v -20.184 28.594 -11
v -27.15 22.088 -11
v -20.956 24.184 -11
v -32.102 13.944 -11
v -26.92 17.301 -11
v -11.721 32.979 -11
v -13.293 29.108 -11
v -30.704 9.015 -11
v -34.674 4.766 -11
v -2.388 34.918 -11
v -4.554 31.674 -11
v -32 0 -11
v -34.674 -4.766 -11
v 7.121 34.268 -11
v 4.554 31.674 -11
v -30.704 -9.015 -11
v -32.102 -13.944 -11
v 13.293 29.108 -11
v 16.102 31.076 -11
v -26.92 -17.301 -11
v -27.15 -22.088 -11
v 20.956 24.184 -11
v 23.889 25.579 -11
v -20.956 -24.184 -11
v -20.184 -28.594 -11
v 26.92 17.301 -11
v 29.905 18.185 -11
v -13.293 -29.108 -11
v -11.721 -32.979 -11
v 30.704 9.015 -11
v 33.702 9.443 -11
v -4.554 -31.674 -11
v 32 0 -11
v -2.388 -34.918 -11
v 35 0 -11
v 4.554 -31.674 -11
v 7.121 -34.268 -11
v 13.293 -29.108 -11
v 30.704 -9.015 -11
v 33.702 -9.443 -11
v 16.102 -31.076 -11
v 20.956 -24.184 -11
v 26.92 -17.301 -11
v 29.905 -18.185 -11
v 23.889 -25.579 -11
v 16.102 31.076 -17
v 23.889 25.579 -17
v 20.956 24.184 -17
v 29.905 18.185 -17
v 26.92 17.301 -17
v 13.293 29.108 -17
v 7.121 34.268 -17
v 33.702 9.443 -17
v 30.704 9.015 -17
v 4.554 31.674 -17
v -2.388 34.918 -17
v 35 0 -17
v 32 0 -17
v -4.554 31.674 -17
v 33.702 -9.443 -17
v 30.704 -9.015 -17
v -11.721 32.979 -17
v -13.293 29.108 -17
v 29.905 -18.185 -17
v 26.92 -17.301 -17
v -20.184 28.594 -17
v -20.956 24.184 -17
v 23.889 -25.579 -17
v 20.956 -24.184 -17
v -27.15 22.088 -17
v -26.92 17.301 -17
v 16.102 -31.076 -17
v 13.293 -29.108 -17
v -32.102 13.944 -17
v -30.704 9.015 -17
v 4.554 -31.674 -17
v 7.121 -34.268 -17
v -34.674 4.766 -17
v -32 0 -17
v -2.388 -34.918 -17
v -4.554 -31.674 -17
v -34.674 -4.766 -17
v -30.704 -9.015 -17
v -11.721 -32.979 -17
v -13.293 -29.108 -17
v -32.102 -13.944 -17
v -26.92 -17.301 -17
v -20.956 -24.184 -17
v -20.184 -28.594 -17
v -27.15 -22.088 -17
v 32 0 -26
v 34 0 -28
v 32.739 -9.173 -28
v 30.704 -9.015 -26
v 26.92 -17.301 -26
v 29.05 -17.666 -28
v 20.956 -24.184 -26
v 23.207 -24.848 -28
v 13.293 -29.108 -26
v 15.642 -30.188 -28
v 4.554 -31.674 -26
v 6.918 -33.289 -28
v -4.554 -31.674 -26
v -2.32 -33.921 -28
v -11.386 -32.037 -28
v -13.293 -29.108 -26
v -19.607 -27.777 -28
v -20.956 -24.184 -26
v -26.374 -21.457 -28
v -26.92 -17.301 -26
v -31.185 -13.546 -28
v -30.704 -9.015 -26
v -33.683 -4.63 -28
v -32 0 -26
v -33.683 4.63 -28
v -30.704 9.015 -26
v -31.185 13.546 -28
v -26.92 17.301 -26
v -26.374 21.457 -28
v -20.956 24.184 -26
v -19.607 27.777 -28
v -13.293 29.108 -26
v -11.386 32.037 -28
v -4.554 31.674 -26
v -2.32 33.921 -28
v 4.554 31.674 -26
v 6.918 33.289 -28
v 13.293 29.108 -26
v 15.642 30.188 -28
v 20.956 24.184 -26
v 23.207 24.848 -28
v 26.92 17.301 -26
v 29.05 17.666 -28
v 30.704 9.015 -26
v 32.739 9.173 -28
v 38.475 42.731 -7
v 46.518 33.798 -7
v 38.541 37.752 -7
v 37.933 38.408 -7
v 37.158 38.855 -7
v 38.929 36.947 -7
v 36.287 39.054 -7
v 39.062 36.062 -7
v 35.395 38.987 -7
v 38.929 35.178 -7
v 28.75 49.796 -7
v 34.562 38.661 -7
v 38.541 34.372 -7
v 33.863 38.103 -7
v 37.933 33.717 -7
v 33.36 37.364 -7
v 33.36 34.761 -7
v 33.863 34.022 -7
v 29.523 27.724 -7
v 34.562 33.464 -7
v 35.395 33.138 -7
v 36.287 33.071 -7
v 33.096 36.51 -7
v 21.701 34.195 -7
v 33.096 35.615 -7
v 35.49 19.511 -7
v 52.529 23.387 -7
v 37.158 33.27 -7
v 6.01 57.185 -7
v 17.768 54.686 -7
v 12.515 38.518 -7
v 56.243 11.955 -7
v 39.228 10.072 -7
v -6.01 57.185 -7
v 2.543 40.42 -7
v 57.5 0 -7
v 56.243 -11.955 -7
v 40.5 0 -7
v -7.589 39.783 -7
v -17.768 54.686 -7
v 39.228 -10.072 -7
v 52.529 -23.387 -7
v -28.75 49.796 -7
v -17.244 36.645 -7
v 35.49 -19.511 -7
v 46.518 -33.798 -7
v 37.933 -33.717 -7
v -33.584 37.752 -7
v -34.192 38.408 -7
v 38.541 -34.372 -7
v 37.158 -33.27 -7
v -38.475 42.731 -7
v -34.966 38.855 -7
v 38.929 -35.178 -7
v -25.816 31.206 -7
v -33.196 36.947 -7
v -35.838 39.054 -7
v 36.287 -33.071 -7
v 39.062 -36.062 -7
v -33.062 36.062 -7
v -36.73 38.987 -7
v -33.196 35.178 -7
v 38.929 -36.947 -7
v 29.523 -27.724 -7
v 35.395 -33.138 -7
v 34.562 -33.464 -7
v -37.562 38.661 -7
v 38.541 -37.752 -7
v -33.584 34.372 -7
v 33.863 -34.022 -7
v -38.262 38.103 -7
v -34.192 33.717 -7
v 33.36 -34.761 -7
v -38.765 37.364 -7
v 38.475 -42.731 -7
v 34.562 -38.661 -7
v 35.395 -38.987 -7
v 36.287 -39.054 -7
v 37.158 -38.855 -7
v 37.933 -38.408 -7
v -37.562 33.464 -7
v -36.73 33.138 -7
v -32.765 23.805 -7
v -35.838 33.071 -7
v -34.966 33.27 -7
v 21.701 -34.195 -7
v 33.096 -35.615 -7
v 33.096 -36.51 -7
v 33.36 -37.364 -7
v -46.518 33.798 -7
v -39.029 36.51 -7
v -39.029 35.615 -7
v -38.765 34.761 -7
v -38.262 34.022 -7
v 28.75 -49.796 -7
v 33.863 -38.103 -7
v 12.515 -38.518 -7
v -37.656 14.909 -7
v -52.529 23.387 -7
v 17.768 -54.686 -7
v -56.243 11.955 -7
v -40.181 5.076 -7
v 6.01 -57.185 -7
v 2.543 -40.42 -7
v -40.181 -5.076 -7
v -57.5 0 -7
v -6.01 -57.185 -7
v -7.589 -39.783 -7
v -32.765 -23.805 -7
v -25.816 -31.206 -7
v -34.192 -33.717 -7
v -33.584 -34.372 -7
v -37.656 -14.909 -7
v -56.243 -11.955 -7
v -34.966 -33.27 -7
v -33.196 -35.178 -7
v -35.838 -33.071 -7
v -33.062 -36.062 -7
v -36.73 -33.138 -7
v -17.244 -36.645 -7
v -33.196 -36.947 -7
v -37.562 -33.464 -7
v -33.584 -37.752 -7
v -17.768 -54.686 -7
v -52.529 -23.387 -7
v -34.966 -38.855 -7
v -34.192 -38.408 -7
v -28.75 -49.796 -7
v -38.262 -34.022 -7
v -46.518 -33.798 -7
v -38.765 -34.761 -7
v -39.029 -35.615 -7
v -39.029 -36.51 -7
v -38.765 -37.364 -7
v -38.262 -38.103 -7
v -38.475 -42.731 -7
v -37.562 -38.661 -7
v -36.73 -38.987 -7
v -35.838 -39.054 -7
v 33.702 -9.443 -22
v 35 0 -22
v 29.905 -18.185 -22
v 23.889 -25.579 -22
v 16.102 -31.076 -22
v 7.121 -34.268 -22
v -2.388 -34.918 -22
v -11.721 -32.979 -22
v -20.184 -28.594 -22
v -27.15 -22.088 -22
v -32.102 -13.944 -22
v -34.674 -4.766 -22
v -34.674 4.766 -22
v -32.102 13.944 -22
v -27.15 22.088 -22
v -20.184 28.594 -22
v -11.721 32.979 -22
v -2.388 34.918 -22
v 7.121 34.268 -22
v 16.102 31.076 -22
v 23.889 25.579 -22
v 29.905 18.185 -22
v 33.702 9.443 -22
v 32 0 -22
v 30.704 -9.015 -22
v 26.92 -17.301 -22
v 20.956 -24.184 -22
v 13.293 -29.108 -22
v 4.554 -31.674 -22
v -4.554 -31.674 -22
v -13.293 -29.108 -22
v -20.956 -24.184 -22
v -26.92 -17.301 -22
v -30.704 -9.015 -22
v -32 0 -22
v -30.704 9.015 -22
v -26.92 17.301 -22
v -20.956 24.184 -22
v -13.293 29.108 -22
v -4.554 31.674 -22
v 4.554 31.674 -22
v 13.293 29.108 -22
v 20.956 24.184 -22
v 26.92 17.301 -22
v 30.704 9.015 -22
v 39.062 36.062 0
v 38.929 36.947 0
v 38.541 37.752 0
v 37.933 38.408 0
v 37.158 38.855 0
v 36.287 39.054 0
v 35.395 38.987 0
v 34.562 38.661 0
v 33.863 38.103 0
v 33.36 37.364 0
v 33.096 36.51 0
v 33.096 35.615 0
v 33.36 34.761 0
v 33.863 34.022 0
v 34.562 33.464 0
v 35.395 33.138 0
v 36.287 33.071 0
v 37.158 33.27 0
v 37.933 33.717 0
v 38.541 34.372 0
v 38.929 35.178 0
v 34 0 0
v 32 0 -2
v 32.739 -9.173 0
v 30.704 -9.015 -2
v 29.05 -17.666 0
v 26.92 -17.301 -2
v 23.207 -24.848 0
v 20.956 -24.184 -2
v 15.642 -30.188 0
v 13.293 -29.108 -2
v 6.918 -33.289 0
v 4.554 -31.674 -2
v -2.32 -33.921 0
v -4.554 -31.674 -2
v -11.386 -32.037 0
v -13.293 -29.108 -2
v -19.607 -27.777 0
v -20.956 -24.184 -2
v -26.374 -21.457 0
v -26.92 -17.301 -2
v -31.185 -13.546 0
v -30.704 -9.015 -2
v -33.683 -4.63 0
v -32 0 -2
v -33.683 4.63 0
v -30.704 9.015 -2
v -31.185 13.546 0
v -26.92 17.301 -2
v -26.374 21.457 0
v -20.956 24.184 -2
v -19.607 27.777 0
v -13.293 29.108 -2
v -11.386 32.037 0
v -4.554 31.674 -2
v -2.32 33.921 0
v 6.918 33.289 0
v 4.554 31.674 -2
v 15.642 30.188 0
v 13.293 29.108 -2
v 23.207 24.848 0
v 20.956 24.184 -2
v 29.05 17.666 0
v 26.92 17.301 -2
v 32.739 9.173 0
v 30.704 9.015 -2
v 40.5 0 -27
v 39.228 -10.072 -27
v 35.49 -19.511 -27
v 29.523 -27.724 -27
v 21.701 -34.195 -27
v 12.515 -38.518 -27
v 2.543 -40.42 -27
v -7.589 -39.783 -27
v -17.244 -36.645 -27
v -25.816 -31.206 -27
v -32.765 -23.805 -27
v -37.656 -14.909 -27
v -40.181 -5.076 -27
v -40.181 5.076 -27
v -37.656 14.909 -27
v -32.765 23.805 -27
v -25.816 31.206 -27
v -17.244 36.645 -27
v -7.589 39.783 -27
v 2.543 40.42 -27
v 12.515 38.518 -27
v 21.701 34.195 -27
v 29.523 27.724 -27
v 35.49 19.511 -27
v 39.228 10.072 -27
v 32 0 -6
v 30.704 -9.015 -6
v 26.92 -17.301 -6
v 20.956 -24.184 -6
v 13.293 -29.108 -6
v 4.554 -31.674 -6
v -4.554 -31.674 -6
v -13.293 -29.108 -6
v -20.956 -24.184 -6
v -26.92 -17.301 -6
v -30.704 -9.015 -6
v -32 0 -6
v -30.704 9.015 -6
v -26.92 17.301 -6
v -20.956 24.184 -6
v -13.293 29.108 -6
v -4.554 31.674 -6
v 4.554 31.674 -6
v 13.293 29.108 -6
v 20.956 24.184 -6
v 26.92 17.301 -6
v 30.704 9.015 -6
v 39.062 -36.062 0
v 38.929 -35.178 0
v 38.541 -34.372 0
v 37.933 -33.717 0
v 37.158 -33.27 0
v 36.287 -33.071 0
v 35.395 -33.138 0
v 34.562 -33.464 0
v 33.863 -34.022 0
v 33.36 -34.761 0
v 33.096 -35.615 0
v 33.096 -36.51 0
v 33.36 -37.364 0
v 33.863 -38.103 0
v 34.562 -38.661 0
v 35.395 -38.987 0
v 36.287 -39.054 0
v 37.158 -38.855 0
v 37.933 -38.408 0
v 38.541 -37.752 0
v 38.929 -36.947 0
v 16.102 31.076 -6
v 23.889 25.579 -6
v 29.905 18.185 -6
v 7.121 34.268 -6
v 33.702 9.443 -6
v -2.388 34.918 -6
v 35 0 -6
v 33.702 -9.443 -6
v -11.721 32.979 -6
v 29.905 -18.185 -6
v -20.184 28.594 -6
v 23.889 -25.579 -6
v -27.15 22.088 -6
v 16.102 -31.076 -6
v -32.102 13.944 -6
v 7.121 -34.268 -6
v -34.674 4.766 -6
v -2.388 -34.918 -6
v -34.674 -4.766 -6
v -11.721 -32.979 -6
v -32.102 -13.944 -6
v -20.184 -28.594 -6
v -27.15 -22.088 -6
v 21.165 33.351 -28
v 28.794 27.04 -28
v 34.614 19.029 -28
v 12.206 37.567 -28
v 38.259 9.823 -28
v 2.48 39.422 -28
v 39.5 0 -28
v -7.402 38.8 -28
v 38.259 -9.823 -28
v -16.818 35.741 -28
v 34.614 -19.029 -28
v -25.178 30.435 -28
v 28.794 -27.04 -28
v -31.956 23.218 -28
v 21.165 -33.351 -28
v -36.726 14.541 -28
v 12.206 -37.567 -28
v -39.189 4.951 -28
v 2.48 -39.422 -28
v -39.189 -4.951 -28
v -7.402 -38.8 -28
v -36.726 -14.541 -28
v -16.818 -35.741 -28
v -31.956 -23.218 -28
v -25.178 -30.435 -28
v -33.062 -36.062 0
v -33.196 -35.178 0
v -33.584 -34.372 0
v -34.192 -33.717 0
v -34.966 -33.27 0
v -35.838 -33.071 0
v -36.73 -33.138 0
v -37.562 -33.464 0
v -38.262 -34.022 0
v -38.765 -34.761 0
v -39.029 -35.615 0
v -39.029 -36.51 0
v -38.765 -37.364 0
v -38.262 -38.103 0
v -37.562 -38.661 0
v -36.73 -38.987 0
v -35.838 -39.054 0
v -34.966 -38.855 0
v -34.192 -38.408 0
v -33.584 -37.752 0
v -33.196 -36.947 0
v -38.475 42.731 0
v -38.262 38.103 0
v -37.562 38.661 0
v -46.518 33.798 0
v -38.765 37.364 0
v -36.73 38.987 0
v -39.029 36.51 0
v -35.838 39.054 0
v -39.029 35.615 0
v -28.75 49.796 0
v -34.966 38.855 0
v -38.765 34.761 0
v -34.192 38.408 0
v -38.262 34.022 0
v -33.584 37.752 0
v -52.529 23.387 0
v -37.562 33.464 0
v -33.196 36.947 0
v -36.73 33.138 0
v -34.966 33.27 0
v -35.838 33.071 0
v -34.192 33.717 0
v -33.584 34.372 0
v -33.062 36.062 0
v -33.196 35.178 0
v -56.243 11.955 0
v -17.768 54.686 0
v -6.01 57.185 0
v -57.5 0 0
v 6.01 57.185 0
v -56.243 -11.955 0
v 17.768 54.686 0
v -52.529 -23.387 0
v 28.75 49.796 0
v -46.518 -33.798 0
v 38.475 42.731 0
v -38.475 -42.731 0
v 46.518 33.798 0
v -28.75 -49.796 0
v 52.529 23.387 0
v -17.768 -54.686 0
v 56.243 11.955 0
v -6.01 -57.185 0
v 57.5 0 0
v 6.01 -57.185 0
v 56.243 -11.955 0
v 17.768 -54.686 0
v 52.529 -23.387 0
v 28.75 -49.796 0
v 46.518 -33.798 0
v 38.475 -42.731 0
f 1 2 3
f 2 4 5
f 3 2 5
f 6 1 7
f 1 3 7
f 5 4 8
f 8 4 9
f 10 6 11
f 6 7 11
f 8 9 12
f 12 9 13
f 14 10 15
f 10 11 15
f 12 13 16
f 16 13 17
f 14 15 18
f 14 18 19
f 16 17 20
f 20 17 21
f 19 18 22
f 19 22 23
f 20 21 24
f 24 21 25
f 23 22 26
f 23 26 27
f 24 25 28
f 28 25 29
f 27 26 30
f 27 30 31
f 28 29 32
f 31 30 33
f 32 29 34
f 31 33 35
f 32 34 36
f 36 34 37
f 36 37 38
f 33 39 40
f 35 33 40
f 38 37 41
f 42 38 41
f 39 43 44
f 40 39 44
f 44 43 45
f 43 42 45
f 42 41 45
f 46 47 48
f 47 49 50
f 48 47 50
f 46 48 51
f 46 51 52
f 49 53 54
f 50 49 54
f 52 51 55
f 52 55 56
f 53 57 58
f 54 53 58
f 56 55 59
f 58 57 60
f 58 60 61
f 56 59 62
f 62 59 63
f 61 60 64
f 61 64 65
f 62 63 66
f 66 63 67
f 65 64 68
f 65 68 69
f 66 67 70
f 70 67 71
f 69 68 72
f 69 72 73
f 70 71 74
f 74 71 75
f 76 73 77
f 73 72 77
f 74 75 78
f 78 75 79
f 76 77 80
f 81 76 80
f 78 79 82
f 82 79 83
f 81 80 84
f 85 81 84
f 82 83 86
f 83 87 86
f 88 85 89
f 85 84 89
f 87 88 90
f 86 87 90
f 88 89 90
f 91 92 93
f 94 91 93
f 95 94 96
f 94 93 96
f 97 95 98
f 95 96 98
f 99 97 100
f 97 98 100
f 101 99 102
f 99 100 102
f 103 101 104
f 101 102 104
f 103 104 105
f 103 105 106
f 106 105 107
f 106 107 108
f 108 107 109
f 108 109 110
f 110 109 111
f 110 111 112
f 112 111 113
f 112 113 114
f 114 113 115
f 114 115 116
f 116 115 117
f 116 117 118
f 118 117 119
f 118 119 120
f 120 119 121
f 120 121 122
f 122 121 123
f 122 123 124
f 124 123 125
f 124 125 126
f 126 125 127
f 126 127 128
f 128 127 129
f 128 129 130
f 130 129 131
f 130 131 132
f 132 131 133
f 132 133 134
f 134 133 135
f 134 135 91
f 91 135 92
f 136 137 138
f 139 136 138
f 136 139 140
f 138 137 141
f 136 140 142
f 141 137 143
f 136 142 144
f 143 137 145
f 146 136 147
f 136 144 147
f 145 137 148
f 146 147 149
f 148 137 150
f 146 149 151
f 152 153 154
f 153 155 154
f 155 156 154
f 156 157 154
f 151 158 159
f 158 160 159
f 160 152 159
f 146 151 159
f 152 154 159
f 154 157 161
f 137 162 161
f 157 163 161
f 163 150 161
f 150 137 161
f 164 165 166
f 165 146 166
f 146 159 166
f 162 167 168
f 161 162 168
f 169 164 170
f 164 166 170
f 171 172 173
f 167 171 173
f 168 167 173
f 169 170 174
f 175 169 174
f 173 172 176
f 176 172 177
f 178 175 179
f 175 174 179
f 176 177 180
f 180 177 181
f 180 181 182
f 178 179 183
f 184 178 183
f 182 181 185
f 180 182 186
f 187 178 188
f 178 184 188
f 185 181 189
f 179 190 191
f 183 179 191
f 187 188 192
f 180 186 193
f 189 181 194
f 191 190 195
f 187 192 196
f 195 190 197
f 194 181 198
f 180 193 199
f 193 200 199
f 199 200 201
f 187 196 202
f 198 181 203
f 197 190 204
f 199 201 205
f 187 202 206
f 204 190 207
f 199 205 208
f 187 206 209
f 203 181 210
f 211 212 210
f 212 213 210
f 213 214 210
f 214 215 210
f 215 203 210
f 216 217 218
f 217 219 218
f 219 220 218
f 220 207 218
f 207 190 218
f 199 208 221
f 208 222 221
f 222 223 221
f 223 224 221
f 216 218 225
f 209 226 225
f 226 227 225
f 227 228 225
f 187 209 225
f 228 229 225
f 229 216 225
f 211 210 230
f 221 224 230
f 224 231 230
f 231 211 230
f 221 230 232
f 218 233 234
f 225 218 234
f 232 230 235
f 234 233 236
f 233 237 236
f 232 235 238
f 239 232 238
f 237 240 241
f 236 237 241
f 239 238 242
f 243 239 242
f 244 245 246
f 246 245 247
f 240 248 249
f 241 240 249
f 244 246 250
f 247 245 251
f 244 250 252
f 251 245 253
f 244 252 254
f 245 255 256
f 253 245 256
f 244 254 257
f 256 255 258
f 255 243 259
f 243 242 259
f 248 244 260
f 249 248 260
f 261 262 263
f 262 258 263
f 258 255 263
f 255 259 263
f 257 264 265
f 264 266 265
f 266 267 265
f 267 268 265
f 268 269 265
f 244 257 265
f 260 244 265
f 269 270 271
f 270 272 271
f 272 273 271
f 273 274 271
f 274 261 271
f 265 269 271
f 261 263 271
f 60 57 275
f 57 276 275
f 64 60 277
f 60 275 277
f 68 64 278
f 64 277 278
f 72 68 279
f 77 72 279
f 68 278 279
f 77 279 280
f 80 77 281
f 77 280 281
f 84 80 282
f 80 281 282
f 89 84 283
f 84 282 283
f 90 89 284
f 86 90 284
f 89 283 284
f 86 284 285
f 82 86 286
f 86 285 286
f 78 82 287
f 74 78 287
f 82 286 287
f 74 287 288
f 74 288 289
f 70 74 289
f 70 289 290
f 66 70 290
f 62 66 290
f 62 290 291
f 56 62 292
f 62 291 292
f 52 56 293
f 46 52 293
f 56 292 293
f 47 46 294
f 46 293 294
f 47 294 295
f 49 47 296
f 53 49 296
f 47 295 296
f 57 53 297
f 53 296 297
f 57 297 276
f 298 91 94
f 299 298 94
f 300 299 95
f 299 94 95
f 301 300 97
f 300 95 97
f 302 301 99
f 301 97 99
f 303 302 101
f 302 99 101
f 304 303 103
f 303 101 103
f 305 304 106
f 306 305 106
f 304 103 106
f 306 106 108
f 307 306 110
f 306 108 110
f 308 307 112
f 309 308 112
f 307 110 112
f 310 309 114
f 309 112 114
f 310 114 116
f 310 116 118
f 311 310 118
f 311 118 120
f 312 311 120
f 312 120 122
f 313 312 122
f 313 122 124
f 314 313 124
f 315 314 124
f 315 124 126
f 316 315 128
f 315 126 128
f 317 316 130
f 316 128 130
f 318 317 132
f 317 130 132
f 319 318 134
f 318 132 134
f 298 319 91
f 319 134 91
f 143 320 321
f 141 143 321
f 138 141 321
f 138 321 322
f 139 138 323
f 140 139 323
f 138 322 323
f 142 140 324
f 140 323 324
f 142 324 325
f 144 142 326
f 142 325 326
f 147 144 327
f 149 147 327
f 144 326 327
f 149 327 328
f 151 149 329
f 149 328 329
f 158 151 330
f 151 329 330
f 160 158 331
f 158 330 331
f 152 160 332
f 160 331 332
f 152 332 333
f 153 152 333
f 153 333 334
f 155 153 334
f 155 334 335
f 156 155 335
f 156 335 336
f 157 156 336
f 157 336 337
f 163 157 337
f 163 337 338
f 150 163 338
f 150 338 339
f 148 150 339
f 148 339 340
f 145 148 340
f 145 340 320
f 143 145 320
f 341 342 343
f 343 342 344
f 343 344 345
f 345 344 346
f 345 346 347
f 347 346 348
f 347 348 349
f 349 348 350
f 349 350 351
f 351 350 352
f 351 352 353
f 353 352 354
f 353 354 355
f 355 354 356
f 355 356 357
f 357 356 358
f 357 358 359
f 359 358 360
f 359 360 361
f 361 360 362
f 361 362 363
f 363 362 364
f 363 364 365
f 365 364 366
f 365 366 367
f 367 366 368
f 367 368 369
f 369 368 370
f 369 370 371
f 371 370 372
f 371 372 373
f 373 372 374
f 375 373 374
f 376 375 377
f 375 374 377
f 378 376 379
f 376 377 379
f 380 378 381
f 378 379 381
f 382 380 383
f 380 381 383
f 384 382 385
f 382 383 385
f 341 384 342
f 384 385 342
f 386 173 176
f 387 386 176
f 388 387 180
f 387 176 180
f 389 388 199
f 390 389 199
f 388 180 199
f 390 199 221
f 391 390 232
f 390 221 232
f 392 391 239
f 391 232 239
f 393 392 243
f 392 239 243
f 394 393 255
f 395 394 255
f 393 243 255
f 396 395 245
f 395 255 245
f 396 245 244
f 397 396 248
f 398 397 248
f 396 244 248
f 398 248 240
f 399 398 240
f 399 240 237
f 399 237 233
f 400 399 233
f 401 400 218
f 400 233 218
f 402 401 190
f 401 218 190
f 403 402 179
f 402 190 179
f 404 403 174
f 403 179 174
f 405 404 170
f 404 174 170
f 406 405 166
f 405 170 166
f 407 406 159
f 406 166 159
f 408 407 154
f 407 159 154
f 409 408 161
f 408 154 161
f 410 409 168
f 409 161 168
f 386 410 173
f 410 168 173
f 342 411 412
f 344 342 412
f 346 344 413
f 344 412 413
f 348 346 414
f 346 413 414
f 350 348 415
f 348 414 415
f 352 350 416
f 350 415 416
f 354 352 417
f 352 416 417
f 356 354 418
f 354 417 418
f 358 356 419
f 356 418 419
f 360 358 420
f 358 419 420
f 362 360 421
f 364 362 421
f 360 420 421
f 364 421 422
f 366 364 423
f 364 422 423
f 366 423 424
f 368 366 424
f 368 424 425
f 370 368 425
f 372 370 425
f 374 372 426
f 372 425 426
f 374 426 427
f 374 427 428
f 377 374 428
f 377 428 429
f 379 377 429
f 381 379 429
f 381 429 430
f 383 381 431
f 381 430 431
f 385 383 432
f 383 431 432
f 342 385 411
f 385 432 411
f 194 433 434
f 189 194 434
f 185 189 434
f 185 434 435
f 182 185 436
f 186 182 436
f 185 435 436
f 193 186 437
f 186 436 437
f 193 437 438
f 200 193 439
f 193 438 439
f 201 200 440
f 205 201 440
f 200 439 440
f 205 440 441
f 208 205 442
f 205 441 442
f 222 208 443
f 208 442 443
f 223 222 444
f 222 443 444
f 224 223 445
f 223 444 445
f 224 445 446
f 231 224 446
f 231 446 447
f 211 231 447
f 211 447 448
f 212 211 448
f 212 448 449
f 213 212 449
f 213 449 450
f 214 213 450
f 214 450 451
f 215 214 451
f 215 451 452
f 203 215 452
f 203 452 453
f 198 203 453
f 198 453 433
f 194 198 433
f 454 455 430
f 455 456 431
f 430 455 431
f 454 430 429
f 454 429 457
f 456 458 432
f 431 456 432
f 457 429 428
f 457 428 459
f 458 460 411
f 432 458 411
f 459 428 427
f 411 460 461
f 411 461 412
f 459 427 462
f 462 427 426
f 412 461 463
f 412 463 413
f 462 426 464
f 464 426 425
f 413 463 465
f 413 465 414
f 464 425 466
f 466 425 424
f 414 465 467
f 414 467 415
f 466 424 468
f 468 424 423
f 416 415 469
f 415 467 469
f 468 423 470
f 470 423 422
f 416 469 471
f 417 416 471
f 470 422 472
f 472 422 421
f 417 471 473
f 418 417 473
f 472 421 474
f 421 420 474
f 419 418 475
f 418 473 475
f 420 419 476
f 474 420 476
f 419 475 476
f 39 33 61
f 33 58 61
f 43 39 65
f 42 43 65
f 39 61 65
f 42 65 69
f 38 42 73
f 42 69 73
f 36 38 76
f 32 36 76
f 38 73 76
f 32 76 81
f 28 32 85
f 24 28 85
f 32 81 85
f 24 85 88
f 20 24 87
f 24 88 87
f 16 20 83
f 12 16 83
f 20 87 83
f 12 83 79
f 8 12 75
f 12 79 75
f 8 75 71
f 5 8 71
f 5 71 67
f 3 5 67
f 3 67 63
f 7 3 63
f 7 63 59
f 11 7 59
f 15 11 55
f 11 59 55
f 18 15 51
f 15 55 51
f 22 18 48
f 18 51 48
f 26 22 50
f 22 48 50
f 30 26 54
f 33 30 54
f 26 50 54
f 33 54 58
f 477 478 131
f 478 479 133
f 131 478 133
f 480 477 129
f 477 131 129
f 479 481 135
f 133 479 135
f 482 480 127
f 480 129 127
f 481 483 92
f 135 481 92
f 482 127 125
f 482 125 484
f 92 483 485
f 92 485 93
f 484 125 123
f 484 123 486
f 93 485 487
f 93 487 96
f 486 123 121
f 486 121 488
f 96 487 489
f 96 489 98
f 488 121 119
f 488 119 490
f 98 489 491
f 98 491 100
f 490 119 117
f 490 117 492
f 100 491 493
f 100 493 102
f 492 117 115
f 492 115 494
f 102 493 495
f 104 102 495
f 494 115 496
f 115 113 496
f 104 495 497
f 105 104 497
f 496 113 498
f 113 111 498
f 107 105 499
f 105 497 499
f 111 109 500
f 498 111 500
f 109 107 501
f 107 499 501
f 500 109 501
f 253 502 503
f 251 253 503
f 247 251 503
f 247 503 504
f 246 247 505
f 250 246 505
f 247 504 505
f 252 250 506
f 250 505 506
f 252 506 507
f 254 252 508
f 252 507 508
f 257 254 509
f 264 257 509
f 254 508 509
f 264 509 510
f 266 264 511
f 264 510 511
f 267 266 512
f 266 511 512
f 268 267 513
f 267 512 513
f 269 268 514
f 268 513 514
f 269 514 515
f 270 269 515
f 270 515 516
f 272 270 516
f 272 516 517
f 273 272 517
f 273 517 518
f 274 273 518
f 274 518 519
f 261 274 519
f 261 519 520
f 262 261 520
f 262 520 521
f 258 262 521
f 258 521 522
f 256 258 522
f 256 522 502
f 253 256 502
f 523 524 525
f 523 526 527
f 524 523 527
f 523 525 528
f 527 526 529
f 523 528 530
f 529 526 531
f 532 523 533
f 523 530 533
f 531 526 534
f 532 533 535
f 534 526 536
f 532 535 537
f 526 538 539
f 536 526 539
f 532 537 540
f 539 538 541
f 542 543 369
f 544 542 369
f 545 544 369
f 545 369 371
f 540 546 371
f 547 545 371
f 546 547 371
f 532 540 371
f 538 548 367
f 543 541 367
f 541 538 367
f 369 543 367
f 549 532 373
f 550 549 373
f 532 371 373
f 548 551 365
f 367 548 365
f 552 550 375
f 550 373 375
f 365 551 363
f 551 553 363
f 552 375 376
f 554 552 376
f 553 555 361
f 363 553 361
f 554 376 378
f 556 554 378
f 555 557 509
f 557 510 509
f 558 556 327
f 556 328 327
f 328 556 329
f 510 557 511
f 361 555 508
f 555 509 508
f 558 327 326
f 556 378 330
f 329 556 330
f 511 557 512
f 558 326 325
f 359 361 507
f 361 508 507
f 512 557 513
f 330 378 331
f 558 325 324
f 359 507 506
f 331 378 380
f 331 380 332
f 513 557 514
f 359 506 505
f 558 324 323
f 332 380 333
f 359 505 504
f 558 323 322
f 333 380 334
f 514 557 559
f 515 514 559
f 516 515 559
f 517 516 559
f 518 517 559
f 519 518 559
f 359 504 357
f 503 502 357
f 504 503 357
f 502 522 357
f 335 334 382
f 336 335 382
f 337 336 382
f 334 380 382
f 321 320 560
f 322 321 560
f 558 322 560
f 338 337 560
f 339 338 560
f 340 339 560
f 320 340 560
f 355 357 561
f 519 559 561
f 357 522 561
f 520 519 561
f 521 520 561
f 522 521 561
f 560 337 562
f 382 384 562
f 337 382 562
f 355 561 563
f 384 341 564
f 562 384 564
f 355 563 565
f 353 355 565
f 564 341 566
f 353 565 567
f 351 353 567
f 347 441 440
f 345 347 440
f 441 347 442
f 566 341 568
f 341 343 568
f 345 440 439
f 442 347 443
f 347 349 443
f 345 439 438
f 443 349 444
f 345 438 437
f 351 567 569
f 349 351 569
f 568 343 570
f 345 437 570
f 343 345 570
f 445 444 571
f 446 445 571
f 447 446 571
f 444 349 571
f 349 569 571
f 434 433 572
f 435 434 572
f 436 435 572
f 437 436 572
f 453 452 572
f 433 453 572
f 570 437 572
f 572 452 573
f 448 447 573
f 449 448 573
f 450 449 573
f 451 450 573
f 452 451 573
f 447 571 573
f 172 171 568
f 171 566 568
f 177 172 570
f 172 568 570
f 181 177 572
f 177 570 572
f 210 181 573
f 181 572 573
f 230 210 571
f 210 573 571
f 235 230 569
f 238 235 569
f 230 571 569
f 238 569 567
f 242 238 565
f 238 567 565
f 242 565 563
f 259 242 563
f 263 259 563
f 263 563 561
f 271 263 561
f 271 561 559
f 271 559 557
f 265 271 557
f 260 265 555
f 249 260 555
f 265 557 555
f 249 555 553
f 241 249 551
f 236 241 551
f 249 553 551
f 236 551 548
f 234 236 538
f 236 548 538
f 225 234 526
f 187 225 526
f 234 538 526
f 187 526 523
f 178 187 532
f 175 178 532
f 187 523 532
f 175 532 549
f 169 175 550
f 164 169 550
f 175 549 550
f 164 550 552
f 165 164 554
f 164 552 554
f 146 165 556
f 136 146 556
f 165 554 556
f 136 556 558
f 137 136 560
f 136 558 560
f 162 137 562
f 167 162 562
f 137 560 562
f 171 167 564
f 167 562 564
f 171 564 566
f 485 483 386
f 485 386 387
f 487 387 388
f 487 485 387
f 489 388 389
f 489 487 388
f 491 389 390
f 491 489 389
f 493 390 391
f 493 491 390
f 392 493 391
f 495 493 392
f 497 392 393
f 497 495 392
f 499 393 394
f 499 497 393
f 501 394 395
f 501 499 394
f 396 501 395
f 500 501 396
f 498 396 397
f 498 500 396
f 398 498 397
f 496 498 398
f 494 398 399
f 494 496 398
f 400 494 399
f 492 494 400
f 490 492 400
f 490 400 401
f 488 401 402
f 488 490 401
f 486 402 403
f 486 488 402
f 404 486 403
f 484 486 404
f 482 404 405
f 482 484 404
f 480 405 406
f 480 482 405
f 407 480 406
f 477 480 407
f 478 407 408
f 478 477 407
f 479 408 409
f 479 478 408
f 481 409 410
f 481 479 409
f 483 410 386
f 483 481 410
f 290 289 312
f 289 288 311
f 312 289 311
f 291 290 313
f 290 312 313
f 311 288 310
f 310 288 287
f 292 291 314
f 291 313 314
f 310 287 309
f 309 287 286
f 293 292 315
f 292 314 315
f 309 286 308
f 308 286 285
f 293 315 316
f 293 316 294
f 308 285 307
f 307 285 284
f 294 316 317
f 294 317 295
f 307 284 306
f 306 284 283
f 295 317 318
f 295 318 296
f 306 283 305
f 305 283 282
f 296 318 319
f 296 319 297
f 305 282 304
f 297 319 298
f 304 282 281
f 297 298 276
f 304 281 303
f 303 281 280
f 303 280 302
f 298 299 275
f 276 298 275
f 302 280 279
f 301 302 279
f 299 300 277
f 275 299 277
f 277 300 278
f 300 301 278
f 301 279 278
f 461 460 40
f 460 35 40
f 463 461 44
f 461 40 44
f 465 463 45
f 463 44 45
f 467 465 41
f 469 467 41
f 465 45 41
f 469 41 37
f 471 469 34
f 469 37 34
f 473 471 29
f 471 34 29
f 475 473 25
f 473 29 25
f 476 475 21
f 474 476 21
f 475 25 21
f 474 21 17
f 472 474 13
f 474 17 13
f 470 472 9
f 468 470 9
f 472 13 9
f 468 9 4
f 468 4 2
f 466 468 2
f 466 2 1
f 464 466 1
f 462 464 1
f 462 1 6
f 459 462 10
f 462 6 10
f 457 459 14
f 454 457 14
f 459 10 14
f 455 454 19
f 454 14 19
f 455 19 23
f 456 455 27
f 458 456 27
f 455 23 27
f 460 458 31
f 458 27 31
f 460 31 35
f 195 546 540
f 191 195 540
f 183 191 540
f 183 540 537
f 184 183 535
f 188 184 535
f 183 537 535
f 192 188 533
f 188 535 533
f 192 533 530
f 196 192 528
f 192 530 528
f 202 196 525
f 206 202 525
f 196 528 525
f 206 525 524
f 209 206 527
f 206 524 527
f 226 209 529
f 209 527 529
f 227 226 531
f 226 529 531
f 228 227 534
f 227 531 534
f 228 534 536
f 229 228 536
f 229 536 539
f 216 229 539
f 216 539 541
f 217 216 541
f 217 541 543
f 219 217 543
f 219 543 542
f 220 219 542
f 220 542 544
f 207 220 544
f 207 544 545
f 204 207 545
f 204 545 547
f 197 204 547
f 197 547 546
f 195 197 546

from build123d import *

# Parameters (mm, degrees)
F2_SIZE  = 2
F3_SIZE  = 1
F4_R     = 3
F5_DEPTH = 25


with BuildPart() as f1:
    # F0 (on Front) → F1 (revolve)
    with BuildSketch(Plane.XZ):
        Polygon((57.5, 0), (32, 0), (32, -6), (35, -6), (35, -11), (32, -11), (32, -17), (35, -17), (35, -22), (32, -22), (32, -28), (40.5, -28), (40.5, -7), (57.5, -7), align=None)
    revolve(axis=Axis((0, 0, -4.022711), (0, 0, -1)))

    # F2
    f2_edges = [f1.edges().sort_by_distance(p)[0] for p in [
        (-32, 0, 0),
        (-32, 0, -28),
    ]]
    chamfer(f2_edges, length=F2_SIZE)

    # F3
    f3_edges = [f1.edges().sort_by_distance(p)[0] for p in [
        (-40.5, 0, -28),
    ]]
    chamfer(f3_edges, length=F3_SIZE)

    # F4 (on face) → F5 (cut)
    with BuildSketch(Plane.XY):
        with Locations((-36.062446, 36.062446)):
            Circle(F4_R)
        with Locations((36.062446, 36.062446)):
            Circle(F4_R)
        with Locations((36.062446, -36.062446)):
            Circle(F4_R)
        with Locations((-36.062446, -36.062446)):
            Circle(F4_R)
    extrude(amount=-F5_DEPTH, mode=Mode.SUBTRACT)


solid = f1.part
